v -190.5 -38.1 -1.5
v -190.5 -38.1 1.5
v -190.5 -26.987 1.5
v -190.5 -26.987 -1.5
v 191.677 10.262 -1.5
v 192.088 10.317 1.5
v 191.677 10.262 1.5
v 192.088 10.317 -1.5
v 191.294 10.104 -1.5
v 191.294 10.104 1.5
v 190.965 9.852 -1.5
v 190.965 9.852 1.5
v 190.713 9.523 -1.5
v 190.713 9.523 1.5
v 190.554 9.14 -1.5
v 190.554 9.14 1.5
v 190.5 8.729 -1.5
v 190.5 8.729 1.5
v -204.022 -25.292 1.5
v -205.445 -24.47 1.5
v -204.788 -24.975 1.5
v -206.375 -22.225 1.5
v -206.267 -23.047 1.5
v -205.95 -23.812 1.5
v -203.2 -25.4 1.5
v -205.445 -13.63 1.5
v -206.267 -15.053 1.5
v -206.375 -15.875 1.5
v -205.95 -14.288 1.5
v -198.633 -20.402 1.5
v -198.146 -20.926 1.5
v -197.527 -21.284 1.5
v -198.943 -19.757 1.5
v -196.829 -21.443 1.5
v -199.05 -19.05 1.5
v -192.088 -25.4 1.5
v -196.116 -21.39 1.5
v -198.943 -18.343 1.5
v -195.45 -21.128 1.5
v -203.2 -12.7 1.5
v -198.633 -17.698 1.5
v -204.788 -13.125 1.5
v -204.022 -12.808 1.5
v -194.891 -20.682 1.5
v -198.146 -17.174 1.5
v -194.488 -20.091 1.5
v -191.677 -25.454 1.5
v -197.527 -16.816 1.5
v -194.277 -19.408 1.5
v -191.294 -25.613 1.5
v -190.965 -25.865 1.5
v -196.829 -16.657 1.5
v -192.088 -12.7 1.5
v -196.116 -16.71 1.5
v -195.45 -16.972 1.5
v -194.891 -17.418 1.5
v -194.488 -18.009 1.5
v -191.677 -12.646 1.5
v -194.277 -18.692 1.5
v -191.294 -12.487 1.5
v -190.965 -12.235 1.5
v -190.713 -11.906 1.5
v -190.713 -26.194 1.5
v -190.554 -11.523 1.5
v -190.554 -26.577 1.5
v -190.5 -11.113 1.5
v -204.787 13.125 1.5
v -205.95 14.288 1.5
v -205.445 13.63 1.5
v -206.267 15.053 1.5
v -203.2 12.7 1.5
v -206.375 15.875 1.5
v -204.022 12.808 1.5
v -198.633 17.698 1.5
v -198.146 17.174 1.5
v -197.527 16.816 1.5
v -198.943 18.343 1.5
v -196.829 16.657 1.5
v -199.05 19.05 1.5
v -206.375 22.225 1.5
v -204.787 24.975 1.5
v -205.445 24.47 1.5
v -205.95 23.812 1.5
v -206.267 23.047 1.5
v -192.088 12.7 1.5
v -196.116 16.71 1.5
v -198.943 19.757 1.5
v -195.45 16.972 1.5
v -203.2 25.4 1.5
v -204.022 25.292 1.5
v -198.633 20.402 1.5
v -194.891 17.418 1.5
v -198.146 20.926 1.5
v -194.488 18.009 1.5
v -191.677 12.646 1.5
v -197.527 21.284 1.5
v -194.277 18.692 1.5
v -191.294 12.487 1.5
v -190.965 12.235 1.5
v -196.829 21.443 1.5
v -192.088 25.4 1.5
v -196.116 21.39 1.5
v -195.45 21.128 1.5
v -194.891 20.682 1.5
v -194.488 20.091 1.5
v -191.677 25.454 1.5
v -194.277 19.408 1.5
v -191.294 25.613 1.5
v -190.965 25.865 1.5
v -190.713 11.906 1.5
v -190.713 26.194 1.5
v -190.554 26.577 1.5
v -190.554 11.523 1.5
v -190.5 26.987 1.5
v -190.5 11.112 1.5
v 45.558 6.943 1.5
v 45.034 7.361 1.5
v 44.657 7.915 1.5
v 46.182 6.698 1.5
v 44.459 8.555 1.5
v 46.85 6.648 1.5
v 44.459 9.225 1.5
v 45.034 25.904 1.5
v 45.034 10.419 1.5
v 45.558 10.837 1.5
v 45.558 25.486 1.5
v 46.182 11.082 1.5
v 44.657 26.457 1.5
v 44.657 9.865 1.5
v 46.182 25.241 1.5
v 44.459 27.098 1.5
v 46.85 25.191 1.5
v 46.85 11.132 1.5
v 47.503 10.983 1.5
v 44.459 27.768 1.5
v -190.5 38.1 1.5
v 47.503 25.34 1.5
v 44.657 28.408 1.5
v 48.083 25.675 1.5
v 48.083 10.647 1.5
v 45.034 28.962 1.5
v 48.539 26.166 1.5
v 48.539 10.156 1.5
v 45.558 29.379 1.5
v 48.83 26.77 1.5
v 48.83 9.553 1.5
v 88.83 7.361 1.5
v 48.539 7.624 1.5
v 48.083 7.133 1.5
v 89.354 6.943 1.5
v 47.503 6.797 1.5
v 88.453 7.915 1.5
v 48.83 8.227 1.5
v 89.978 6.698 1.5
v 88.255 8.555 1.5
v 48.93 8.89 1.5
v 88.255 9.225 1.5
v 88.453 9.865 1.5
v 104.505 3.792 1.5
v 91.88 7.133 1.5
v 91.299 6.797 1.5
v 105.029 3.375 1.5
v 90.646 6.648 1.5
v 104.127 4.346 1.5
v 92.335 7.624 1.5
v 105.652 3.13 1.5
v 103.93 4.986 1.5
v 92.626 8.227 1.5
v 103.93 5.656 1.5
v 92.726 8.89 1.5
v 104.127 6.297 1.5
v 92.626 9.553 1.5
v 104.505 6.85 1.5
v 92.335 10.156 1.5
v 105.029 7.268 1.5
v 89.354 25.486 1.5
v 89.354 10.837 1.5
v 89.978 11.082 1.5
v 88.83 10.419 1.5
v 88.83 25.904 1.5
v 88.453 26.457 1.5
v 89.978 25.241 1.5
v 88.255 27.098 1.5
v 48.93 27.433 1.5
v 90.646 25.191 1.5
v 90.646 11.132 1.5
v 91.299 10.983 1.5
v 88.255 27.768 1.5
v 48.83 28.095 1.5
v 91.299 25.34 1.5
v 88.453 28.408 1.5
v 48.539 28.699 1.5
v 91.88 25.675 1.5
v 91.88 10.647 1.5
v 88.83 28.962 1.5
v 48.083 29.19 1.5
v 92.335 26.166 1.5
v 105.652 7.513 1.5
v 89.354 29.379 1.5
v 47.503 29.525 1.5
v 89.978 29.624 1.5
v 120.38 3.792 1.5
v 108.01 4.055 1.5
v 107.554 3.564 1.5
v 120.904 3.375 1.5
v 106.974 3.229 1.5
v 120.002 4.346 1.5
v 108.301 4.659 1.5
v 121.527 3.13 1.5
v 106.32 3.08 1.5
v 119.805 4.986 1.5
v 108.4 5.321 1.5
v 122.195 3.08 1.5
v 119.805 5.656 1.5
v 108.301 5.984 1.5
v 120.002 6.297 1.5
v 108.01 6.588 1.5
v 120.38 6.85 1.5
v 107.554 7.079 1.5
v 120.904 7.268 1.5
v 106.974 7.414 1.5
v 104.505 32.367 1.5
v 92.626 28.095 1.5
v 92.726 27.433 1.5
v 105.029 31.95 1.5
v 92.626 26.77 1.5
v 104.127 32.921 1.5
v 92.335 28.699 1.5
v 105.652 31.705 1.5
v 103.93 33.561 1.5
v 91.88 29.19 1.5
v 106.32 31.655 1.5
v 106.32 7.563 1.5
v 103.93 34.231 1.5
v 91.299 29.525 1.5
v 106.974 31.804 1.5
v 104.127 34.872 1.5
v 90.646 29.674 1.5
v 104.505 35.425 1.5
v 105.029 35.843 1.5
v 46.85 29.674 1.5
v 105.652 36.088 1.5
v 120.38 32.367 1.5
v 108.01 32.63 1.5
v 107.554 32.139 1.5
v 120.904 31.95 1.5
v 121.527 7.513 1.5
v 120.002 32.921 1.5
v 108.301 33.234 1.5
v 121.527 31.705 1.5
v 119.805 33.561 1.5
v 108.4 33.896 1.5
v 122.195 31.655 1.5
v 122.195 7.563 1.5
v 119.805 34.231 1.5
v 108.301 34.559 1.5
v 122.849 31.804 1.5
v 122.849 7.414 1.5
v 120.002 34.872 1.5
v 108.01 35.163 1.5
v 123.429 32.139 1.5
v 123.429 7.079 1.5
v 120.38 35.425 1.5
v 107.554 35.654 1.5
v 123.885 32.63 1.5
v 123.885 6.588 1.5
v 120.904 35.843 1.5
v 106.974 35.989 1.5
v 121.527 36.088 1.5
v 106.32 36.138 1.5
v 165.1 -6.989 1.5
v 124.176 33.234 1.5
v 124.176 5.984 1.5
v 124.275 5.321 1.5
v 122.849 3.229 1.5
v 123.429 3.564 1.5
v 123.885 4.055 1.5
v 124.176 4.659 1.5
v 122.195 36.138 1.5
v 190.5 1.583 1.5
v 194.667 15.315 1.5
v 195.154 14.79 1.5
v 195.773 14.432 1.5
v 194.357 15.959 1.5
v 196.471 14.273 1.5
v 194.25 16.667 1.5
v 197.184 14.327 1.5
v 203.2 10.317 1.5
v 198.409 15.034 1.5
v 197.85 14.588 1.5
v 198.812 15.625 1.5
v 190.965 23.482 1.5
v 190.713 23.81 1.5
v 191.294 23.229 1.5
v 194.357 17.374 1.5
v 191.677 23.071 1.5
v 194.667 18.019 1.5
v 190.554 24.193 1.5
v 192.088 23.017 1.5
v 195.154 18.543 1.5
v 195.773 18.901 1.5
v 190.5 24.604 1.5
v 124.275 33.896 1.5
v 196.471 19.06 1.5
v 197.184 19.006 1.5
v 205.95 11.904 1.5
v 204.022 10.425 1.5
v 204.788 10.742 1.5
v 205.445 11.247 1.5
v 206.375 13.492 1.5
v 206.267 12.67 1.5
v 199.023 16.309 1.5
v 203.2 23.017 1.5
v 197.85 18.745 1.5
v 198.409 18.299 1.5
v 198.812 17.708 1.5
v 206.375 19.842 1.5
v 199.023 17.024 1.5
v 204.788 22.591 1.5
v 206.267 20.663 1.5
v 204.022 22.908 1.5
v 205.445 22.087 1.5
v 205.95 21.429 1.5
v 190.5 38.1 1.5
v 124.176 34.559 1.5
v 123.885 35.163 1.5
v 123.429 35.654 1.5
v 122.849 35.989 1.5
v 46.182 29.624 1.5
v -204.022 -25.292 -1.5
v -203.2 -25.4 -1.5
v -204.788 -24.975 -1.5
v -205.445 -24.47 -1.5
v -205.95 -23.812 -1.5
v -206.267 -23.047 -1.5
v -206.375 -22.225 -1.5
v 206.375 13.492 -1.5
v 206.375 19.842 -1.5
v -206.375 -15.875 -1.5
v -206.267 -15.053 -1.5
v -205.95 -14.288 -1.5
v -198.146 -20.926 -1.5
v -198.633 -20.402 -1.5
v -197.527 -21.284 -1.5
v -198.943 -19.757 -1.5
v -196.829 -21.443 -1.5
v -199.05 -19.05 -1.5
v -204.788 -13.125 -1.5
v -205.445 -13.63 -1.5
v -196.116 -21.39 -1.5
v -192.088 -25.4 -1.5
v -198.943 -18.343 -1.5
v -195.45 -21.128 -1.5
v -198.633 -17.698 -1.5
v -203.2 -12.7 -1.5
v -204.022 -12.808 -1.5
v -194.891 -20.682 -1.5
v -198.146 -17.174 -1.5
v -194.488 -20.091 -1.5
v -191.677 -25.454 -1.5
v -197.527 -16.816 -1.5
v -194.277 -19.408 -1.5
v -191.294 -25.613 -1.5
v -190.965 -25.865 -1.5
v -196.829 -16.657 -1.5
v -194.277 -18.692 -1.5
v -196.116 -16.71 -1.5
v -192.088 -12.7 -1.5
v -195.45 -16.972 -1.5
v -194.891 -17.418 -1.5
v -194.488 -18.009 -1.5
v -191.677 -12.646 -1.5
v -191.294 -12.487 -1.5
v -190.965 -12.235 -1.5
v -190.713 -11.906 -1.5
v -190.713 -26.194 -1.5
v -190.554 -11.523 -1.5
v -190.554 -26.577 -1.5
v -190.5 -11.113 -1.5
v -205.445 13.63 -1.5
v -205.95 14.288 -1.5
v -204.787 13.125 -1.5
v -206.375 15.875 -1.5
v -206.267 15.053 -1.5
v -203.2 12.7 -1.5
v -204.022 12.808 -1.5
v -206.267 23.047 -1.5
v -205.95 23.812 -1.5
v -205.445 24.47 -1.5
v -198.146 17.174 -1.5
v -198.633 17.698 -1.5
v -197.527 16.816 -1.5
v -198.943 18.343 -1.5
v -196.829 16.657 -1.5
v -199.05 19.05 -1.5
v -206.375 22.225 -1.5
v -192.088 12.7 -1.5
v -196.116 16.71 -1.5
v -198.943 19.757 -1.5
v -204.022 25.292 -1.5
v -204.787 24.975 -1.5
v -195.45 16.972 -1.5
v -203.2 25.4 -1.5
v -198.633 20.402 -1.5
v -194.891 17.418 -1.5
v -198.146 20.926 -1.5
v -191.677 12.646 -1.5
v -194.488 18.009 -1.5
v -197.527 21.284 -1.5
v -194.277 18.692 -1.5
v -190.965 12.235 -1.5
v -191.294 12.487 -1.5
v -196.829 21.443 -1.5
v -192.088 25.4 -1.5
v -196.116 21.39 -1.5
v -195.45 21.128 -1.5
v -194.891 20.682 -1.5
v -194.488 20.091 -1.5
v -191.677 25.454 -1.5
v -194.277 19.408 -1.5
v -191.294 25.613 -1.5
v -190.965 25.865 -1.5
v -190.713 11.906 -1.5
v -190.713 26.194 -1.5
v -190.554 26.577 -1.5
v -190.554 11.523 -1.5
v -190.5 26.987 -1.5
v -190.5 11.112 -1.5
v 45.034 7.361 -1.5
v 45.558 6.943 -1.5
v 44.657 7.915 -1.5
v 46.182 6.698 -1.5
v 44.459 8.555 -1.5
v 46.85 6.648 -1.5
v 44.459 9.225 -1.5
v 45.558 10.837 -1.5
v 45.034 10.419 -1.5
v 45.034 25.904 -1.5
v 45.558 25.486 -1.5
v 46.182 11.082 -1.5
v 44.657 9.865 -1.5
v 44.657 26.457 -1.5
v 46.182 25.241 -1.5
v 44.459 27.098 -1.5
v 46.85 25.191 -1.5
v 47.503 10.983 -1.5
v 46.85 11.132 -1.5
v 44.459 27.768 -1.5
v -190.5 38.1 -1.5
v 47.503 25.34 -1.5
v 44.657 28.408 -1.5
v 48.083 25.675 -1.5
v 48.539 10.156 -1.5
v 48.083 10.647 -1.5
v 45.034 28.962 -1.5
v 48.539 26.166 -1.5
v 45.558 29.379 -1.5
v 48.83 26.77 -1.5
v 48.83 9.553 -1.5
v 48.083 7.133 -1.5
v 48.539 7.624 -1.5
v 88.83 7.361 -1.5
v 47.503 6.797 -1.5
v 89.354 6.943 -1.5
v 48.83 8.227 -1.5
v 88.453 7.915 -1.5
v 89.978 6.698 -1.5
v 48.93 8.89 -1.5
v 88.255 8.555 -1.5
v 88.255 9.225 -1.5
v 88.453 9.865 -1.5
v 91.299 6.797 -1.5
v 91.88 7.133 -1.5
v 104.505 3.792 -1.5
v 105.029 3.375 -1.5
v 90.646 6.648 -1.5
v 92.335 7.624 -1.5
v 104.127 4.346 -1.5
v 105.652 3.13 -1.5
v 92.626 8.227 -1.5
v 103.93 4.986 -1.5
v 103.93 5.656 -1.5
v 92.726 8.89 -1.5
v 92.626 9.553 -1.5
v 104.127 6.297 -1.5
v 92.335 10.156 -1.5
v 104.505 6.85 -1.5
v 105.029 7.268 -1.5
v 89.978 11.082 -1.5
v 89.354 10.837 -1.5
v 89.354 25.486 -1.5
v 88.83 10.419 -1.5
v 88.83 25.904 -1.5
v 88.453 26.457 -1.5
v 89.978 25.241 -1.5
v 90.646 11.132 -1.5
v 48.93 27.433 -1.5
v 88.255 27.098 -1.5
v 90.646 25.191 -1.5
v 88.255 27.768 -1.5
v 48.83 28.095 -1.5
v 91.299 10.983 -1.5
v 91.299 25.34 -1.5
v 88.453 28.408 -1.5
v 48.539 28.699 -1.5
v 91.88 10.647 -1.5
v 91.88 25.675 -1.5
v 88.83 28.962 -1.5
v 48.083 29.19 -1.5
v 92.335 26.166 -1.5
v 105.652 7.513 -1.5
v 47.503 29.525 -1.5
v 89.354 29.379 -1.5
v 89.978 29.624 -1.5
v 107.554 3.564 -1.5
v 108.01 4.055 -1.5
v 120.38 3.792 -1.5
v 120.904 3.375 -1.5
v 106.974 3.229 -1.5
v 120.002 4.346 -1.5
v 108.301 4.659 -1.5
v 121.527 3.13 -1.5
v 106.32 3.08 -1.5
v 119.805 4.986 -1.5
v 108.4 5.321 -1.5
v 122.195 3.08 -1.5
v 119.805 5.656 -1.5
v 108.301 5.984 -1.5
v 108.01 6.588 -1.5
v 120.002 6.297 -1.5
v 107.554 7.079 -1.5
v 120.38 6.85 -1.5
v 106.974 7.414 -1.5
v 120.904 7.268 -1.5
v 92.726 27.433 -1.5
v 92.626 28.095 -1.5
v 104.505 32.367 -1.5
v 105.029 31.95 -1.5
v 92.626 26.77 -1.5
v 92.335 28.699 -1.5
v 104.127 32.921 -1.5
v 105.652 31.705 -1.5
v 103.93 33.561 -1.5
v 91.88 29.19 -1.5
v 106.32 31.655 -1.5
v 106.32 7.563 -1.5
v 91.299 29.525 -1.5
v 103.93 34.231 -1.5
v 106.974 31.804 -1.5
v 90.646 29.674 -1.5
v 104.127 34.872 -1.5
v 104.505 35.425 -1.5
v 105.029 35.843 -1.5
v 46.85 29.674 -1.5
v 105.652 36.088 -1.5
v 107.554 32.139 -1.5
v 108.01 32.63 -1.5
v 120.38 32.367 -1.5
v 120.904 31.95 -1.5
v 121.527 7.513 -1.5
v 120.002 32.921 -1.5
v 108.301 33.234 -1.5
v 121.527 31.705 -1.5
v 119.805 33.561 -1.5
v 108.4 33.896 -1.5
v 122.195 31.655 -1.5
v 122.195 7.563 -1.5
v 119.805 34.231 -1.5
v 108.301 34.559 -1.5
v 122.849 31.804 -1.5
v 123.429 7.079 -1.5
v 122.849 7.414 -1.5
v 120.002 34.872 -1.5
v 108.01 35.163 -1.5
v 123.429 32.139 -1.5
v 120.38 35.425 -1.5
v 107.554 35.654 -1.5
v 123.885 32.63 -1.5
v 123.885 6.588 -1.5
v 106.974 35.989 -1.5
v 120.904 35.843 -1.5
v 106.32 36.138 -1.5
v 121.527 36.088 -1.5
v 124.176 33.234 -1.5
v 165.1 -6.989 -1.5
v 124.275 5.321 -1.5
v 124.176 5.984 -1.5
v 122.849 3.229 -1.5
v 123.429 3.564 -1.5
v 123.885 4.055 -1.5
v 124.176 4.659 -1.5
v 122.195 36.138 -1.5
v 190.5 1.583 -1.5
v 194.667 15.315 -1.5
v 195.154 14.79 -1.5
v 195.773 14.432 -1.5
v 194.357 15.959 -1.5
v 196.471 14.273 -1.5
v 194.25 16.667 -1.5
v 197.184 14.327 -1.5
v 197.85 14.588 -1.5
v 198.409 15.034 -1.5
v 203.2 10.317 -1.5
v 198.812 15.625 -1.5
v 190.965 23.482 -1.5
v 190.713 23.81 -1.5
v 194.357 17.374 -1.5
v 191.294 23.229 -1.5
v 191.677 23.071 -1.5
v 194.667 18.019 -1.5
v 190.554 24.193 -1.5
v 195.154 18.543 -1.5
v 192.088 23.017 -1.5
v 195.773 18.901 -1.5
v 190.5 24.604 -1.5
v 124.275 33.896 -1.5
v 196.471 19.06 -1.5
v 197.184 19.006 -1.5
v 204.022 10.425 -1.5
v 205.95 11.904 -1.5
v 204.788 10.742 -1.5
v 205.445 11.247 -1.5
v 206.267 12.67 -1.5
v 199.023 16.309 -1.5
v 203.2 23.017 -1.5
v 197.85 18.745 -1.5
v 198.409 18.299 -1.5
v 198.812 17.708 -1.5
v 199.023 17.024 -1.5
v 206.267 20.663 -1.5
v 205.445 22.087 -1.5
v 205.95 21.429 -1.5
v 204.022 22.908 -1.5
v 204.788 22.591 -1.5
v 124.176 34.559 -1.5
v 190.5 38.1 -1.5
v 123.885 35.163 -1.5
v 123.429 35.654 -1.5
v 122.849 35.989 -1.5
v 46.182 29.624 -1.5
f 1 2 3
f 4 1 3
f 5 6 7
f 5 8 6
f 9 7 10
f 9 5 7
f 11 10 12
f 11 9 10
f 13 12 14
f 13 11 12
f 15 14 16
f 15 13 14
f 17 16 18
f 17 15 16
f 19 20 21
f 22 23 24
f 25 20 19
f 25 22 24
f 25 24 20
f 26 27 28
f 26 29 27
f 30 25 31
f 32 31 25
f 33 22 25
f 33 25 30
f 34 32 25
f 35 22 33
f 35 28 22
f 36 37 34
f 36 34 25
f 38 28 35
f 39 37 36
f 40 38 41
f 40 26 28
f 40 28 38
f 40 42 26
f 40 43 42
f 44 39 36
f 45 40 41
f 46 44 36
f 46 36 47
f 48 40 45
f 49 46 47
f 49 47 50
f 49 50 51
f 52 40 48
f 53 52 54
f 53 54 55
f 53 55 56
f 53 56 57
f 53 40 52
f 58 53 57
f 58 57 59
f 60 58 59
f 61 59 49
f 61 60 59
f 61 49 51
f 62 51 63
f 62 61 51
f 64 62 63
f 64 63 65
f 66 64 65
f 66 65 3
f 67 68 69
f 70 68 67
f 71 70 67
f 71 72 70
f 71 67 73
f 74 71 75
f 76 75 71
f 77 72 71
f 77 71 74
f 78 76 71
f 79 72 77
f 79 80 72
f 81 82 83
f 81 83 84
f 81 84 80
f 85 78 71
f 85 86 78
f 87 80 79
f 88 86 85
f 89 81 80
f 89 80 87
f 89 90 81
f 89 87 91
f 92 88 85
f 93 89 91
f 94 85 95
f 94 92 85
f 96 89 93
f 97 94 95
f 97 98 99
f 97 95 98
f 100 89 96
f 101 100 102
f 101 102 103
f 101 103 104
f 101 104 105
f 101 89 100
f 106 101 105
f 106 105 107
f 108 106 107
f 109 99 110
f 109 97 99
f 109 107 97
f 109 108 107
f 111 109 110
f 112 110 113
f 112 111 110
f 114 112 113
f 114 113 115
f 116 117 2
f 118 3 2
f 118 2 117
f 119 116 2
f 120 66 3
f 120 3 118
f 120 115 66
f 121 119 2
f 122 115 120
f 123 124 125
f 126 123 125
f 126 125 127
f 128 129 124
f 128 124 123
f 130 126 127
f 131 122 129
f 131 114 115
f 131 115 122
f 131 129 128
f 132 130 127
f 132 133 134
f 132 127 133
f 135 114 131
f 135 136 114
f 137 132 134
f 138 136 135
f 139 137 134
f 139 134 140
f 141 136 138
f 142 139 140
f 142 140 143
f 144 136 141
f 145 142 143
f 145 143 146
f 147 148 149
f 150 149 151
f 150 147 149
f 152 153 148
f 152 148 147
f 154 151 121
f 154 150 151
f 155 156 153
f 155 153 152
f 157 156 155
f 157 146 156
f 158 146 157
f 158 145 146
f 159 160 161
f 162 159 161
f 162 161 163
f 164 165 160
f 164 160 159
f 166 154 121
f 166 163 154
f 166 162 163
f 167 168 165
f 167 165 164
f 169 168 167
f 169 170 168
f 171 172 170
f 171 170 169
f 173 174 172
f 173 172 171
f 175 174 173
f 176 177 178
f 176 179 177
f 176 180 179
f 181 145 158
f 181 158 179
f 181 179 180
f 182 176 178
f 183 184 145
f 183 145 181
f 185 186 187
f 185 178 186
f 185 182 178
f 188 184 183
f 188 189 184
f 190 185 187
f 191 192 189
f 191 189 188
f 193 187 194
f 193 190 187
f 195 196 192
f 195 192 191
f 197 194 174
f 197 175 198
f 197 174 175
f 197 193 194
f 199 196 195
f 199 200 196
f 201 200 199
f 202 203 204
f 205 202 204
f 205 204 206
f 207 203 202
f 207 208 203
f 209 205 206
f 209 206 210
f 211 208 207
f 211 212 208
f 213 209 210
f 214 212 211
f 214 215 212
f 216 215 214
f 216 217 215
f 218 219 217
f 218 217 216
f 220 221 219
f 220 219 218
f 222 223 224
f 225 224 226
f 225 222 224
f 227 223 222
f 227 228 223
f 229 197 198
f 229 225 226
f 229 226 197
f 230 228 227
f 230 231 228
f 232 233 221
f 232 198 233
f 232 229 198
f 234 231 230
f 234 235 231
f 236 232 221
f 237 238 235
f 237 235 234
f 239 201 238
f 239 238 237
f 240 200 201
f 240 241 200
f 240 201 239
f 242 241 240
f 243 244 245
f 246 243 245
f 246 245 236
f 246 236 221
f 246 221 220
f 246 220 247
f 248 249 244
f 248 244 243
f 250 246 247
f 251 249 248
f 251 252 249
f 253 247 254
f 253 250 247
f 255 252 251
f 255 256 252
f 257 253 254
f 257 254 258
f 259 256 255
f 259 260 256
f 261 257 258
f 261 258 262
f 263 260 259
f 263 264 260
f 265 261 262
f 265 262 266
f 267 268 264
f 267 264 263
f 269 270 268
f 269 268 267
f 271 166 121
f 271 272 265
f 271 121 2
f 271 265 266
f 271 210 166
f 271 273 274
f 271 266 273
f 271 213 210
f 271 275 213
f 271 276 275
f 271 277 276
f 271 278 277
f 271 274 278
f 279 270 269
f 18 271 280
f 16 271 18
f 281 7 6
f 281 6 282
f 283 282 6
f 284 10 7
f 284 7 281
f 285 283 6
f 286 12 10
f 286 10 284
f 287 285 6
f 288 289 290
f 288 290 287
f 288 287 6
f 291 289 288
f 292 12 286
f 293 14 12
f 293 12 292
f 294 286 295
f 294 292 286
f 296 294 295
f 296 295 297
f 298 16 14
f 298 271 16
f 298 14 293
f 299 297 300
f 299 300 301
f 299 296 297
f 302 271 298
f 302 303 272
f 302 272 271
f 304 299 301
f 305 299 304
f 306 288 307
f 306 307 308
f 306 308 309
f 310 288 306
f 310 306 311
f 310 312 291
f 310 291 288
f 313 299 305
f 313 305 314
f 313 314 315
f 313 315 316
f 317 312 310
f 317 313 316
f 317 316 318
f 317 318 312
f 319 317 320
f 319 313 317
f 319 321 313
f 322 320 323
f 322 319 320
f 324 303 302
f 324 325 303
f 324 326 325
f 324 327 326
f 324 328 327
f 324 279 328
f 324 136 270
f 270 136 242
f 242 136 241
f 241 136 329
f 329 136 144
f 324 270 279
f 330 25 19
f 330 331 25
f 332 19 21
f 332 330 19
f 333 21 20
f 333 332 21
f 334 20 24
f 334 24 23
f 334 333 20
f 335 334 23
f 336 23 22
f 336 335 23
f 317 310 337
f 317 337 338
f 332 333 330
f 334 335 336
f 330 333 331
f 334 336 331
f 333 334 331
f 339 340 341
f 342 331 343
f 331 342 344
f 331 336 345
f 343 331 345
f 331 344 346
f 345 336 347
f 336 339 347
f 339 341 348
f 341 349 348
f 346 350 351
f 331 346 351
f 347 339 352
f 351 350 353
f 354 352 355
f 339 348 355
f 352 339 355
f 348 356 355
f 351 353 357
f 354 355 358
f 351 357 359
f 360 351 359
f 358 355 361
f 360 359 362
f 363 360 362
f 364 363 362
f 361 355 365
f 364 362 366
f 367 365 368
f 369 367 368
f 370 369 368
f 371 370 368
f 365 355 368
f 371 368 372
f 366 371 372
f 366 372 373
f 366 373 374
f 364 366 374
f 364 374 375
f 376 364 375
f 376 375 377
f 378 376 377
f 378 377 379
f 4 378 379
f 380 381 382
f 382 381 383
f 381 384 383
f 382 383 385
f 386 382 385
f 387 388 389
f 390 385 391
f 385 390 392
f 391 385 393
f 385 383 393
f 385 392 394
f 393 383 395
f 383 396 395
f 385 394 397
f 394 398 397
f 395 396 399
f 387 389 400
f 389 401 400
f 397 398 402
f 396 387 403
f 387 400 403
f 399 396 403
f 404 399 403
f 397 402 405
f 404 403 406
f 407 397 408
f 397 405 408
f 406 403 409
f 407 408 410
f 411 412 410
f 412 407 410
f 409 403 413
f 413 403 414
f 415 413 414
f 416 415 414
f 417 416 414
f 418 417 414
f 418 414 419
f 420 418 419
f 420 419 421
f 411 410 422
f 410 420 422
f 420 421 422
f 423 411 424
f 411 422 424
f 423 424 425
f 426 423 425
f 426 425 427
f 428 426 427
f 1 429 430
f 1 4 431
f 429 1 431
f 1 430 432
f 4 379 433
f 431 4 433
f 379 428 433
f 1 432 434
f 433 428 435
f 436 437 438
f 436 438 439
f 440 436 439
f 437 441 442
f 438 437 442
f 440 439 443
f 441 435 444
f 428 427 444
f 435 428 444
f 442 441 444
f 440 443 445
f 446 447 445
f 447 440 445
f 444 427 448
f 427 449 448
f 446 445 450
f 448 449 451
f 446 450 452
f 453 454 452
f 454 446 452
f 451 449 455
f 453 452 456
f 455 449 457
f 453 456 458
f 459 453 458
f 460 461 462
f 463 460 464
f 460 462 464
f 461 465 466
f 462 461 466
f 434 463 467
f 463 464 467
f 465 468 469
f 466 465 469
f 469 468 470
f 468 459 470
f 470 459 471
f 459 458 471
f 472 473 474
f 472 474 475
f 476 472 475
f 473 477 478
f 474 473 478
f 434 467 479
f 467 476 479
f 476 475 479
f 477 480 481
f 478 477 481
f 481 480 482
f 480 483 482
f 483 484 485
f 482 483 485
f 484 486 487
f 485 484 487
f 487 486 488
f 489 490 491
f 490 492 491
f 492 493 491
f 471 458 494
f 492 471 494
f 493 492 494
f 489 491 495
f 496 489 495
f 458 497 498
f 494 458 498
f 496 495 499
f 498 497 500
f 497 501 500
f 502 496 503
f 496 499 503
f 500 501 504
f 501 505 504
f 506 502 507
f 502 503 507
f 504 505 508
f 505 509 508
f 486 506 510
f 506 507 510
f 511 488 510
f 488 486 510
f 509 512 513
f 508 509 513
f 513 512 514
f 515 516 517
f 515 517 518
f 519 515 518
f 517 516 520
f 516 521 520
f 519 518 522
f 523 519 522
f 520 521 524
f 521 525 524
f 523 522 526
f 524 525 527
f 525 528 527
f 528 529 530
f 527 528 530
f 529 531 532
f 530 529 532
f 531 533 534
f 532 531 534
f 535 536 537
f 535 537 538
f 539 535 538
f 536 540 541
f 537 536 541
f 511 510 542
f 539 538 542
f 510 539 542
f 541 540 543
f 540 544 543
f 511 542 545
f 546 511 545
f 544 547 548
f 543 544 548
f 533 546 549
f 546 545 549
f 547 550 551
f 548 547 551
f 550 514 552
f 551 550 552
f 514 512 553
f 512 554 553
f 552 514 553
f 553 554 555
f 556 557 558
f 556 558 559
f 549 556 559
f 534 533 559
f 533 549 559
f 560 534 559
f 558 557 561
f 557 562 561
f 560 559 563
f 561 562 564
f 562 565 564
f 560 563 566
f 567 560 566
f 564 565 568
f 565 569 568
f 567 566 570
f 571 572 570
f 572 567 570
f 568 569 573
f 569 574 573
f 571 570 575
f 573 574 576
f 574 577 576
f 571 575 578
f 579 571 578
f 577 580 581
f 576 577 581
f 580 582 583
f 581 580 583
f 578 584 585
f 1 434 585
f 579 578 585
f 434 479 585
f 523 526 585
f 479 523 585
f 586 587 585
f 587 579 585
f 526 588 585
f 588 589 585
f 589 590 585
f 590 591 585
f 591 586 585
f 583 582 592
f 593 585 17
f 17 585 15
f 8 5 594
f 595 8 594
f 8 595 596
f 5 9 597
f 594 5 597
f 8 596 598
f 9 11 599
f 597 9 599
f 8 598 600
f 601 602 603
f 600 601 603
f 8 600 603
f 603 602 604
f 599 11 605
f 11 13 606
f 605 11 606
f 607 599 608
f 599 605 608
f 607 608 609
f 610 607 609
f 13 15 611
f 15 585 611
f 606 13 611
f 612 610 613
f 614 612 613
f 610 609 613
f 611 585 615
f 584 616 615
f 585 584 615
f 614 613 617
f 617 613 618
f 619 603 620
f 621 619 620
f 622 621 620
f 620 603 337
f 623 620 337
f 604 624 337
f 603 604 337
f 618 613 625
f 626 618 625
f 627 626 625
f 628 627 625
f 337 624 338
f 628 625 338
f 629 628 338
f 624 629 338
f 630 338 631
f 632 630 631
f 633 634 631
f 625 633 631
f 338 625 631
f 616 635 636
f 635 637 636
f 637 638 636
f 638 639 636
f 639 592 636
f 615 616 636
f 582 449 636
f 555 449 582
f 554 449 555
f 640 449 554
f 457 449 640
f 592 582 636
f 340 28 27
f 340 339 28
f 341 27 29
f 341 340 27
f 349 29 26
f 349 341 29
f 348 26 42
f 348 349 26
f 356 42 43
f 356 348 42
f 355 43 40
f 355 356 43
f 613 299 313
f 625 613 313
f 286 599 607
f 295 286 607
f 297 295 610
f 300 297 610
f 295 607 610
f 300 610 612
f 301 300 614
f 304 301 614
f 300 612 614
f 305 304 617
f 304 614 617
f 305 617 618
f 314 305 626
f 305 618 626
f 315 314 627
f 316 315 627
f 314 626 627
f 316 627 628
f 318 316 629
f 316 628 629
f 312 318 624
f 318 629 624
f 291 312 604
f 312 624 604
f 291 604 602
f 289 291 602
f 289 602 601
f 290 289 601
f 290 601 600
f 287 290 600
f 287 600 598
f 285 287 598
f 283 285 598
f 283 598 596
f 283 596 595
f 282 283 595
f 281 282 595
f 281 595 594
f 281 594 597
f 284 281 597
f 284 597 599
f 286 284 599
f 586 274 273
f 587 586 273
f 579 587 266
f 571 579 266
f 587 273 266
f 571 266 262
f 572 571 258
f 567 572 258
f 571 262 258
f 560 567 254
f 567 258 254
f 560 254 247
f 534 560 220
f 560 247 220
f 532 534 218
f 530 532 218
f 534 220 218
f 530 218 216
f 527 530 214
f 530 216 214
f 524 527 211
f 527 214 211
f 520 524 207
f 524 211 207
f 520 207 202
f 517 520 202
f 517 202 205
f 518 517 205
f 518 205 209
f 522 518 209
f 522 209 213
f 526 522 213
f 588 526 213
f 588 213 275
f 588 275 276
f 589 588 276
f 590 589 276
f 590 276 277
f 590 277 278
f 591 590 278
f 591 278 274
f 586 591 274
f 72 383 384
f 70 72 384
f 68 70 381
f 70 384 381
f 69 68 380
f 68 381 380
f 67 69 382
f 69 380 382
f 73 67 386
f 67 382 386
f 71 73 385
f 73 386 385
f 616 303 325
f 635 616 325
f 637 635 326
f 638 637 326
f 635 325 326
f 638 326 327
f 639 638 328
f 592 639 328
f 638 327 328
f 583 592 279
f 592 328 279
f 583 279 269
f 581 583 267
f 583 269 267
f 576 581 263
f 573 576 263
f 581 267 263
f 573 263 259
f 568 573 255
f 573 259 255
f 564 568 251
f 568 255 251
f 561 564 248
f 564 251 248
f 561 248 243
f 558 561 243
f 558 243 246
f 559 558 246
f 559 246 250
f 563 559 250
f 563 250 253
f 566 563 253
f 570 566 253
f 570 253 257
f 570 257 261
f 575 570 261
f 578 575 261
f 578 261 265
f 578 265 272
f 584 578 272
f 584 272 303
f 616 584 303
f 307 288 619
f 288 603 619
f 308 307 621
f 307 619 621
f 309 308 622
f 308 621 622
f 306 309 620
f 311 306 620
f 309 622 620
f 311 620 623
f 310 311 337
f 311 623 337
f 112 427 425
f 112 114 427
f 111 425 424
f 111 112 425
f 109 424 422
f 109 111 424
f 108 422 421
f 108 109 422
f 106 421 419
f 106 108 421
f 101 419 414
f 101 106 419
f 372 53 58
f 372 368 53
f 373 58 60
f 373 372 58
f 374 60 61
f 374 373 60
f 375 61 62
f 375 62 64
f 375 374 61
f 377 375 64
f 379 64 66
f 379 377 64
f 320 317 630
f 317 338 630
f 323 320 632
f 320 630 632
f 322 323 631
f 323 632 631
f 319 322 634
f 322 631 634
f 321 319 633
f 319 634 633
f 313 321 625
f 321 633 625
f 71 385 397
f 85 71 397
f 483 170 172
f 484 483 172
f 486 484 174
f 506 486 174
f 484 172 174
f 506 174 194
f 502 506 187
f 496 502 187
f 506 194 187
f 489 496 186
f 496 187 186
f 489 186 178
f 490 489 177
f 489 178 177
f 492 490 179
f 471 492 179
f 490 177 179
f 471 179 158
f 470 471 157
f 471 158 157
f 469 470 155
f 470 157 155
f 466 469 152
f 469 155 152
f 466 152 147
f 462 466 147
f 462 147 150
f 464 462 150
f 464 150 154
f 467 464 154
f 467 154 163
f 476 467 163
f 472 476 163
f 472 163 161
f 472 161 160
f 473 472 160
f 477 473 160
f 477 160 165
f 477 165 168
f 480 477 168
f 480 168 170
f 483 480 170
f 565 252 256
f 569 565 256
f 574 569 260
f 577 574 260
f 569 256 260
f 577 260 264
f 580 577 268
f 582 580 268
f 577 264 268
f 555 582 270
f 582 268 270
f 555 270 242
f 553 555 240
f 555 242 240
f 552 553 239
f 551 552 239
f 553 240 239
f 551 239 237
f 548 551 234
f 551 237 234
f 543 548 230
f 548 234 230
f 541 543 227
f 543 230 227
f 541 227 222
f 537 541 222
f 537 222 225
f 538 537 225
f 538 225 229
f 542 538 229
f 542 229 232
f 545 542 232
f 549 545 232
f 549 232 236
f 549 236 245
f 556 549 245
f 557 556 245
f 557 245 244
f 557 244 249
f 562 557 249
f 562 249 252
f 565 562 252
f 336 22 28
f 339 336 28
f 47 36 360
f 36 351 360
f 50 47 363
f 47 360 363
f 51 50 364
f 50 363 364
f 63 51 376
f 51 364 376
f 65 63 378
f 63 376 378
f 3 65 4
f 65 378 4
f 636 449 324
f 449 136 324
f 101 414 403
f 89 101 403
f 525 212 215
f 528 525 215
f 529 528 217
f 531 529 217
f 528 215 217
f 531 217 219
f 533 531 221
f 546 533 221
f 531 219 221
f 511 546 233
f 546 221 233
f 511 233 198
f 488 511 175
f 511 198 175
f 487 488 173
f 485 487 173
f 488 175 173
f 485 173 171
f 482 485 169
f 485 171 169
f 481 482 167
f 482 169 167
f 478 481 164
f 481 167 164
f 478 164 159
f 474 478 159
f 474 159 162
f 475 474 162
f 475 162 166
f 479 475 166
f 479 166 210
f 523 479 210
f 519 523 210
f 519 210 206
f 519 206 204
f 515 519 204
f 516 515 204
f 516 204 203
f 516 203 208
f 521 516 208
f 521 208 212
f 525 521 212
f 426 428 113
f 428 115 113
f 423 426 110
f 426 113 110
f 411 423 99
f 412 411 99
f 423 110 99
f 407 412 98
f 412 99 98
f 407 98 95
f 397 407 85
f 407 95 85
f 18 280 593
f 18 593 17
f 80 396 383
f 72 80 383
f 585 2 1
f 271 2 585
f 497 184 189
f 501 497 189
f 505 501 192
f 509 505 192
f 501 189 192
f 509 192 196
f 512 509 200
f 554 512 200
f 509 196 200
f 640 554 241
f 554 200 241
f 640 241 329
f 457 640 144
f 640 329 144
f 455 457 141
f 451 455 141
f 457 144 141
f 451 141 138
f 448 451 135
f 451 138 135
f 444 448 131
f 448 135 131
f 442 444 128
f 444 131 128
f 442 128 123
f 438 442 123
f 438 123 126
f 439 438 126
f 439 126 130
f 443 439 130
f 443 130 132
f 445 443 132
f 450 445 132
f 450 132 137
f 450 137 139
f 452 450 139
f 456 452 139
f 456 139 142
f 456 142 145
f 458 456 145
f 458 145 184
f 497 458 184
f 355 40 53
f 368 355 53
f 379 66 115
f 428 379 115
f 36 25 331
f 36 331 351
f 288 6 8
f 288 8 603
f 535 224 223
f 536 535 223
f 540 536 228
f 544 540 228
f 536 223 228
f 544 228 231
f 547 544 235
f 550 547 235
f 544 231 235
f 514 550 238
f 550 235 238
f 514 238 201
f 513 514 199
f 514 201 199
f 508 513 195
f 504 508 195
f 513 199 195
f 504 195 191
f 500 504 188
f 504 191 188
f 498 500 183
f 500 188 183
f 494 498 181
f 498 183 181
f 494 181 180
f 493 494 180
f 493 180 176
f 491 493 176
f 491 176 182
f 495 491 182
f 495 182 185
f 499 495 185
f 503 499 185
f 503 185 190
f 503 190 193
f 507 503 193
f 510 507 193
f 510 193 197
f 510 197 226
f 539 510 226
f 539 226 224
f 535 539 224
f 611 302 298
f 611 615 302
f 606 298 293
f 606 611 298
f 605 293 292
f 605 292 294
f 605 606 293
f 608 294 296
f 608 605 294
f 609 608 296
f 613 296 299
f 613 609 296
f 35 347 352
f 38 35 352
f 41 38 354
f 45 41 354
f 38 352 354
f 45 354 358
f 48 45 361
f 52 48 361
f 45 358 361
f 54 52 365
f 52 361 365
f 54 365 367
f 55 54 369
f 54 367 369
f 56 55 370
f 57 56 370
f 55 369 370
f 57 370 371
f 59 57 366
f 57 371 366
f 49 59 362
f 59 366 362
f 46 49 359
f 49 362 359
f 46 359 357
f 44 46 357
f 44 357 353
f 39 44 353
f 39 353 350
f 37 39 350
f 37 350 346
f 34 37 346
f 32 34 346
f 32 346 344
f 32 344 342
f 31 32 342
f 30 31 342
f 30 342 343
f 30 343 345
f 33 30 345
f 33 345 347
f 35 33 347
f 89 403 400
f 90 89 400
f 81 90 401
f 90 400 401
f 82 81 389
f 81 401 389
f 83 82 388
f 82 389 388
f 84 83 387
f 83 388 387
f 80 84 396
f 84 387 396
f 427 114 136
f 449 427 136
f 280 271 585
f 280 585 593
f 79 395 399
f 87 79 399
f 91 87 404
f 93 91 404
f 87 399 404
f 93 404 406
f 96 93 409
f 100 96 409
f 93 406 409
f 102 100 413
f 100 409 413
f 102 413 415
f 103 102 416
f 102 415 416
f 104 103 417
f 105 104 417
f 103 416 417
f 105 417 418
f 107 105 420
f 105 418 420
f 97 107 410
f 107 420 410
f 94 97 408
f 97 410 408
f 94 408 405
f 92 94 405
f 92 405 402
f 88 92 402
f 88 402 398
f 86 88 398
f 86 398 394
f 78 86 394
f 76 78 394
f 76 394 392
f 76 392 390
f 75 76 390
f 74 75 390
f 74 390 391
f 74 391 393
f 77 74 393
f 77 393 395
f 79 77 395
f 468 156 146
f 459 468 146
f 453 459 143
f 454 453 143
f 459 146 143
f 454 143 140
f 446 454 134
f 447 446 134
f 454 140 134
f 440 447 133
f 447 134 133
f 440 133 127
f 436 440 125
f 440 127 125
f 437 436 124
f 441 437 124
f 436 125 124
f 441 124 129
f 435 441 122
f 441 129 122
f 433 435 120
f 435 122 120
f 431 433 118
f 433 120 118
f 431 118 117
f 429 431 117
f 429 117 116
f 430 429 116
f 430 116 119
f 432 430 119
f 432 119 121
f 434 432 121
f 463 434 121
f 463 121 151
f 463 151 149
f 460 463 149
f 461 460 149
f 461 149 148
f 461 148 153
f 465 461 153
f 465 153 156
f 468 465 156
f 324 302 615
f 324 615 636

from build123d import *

# Parameters (mm, degrees)
SKETCH1_W                  = 381
SKETCH1_H                  = 76.2
BOSS_EXTRUDE1_DEPTH        = 1.5
CUT_EXTRUDE1_DEPTH         = 195.29580541
SKETCH3_W                  = 15.875
SKETCH3_H                  = 12.7
BOSS_EXTRUDE2_DEPTH        = 3
FILLET1_R                  = 3.175
MIRROR1_START              = -1.5
MIRROR1_DEPTH              = 3
FILLET3_R                  = 1.5875
FILLET4_R                  = 3.175
F_8_CLEARANCE_HOLE1_D      = 4.4958
F_4_8_4_8_DIAMETER_HOLE1_D = 4.8
CUT_EXTRUDE2_DEPTH         = 210.883897965


# Read off the part's stored shape, not the designer's step: Mirror1
with BuildPart() as part:
    # Sketch1 → Boss-Extrude1 (new, symmetric)
    with BuildSketch(Plane.XY):
        Rectangle(SKETCH1_W, SKETCH1_H)
    extrude(amount=BOSS_EXTRUDE1_DEPTH, both=True)

    # Sketch5 → Cut-Extrude1 (cut, through all)
    with BuildSketch(Plane.XY.offset(1.5)):
        Polygon((-190.5, -38.1), (190.5, -4.766819197), (190.5, -38.1), align=None)
    extrude(amount=-CUT_EXTRUDE1_DEPTH, mode=Mode.SUBTRACT)

    # Sketch3 → Boss-Extrude2 (add)
    with BuildSketch(Plane.XY.offset(1.5)):
        with Locations((-198.4375, -19.05)):
            Rectangle(SKETCH3_W, SKETCH3_H)
        with Locations((198.4375, 16.666590402)):
            Rectangle(SKETCH3_W, SKETCH3_H)
    extrude(amount=-BOSS_EXTRUDE2_DEPTH)

    # Fillet1
    fillet1_edges = [part.edges().sort_by_distance(p)[0] for p in [
        (-206.375, -12.7, 0),
        (-206.375, -25.4, 0),
    ]]
    fillet(fillet1_edges, radius=FILLET1_R)

    # Mirror1 outline → Mirror1 (add)
    with BuildSketch(Plane.XY.offset(MIRROR1_START)):
        with BuildLine():
            Line((-206.375, 22.225), (-206.375, 15.875))
            ThreePointArc((-206.375, 15.875), (-205.44506403, 13.62993597), (-203.2, 12.7))
            Line((-203.2, 12.7), (-190.5, 12.7))
            Line((-190.5, 12.7), (-190.5, 25.4))
            Line((-190.5, 25.4), (-203.2, 25.4))
            ThreePointArc((-203.2, 25.4), (-205.44506403, 24.47006403), (-206.375, 22.225))
        make_face()
    extrude(amount=MIRROR1_DEPTH)

    # Fillet3
    fillet3_edges = [part.edges().sort_by_distance(p)[0] for p in [
        (190.5, 10.316590402, 0),
        (190.5, 23.016590402, 0),
        (-190.5, -25.4, 0),
        (-190.5, -12.7, 0),
        (-190.5, 25.4, 0),
        (-190.5, 12.7, 0),
    ]]
    fillet(fillet3_edges, radius=FILLET3_R)

    # Fillet4
    fillet4_edges = [part.edges().sort_by_distance(p)[0] for p in [
        (206.375, 23.016590402, 0),
        (206.375, 10.316590402, 0),
    ]]
    fillet(fillet4_edges, radius=FILLET4_R)

    # #8 Clearance Hole1 (through all)
    with Locations(Plane(origin=(0, 0, -1.5), x_dir=(-1, 0, 0), z_dir=(0, 0, -1))):
        with Locations((-46.681846327, 8.89), (-46.681846327, 27.432641431), (-90.478153673, 27.432641431), (-90.478153673, 8.89), (-106.1525, 33.896326852), (-122.0275, 33.896326852), (-122.0275, 5.321326852), (-106.1525, 5.321326852)):
            Hole(F_8_CLEARANCE_HOLE1_D / 2)

    # Ø4.8 (4.8) Diameter Hole1 (through all)
    with Locations(Plane.XY.offset(1.5)):
        with Locations((-196.65, 19.05), (-196.65, -19.05), (196.65, 16.666590402)):
            Hole(F_4_8_4_8_DIAMETER_HOLE1_D / 2)

    # Sketch12 → Cut-Extrude2 (cut, through all)
    with BuildSketch(Plane.XY.offset(1.5)):
        Polygon((190.5, -4.766819197), (165.1, -6.98903125), (190.5, 1.583180803), align=None)
    extrude(amount=-CUT_EXTRUDE2_DEPTH, mode=Mode.SUBTRACT)


solid = part.part
